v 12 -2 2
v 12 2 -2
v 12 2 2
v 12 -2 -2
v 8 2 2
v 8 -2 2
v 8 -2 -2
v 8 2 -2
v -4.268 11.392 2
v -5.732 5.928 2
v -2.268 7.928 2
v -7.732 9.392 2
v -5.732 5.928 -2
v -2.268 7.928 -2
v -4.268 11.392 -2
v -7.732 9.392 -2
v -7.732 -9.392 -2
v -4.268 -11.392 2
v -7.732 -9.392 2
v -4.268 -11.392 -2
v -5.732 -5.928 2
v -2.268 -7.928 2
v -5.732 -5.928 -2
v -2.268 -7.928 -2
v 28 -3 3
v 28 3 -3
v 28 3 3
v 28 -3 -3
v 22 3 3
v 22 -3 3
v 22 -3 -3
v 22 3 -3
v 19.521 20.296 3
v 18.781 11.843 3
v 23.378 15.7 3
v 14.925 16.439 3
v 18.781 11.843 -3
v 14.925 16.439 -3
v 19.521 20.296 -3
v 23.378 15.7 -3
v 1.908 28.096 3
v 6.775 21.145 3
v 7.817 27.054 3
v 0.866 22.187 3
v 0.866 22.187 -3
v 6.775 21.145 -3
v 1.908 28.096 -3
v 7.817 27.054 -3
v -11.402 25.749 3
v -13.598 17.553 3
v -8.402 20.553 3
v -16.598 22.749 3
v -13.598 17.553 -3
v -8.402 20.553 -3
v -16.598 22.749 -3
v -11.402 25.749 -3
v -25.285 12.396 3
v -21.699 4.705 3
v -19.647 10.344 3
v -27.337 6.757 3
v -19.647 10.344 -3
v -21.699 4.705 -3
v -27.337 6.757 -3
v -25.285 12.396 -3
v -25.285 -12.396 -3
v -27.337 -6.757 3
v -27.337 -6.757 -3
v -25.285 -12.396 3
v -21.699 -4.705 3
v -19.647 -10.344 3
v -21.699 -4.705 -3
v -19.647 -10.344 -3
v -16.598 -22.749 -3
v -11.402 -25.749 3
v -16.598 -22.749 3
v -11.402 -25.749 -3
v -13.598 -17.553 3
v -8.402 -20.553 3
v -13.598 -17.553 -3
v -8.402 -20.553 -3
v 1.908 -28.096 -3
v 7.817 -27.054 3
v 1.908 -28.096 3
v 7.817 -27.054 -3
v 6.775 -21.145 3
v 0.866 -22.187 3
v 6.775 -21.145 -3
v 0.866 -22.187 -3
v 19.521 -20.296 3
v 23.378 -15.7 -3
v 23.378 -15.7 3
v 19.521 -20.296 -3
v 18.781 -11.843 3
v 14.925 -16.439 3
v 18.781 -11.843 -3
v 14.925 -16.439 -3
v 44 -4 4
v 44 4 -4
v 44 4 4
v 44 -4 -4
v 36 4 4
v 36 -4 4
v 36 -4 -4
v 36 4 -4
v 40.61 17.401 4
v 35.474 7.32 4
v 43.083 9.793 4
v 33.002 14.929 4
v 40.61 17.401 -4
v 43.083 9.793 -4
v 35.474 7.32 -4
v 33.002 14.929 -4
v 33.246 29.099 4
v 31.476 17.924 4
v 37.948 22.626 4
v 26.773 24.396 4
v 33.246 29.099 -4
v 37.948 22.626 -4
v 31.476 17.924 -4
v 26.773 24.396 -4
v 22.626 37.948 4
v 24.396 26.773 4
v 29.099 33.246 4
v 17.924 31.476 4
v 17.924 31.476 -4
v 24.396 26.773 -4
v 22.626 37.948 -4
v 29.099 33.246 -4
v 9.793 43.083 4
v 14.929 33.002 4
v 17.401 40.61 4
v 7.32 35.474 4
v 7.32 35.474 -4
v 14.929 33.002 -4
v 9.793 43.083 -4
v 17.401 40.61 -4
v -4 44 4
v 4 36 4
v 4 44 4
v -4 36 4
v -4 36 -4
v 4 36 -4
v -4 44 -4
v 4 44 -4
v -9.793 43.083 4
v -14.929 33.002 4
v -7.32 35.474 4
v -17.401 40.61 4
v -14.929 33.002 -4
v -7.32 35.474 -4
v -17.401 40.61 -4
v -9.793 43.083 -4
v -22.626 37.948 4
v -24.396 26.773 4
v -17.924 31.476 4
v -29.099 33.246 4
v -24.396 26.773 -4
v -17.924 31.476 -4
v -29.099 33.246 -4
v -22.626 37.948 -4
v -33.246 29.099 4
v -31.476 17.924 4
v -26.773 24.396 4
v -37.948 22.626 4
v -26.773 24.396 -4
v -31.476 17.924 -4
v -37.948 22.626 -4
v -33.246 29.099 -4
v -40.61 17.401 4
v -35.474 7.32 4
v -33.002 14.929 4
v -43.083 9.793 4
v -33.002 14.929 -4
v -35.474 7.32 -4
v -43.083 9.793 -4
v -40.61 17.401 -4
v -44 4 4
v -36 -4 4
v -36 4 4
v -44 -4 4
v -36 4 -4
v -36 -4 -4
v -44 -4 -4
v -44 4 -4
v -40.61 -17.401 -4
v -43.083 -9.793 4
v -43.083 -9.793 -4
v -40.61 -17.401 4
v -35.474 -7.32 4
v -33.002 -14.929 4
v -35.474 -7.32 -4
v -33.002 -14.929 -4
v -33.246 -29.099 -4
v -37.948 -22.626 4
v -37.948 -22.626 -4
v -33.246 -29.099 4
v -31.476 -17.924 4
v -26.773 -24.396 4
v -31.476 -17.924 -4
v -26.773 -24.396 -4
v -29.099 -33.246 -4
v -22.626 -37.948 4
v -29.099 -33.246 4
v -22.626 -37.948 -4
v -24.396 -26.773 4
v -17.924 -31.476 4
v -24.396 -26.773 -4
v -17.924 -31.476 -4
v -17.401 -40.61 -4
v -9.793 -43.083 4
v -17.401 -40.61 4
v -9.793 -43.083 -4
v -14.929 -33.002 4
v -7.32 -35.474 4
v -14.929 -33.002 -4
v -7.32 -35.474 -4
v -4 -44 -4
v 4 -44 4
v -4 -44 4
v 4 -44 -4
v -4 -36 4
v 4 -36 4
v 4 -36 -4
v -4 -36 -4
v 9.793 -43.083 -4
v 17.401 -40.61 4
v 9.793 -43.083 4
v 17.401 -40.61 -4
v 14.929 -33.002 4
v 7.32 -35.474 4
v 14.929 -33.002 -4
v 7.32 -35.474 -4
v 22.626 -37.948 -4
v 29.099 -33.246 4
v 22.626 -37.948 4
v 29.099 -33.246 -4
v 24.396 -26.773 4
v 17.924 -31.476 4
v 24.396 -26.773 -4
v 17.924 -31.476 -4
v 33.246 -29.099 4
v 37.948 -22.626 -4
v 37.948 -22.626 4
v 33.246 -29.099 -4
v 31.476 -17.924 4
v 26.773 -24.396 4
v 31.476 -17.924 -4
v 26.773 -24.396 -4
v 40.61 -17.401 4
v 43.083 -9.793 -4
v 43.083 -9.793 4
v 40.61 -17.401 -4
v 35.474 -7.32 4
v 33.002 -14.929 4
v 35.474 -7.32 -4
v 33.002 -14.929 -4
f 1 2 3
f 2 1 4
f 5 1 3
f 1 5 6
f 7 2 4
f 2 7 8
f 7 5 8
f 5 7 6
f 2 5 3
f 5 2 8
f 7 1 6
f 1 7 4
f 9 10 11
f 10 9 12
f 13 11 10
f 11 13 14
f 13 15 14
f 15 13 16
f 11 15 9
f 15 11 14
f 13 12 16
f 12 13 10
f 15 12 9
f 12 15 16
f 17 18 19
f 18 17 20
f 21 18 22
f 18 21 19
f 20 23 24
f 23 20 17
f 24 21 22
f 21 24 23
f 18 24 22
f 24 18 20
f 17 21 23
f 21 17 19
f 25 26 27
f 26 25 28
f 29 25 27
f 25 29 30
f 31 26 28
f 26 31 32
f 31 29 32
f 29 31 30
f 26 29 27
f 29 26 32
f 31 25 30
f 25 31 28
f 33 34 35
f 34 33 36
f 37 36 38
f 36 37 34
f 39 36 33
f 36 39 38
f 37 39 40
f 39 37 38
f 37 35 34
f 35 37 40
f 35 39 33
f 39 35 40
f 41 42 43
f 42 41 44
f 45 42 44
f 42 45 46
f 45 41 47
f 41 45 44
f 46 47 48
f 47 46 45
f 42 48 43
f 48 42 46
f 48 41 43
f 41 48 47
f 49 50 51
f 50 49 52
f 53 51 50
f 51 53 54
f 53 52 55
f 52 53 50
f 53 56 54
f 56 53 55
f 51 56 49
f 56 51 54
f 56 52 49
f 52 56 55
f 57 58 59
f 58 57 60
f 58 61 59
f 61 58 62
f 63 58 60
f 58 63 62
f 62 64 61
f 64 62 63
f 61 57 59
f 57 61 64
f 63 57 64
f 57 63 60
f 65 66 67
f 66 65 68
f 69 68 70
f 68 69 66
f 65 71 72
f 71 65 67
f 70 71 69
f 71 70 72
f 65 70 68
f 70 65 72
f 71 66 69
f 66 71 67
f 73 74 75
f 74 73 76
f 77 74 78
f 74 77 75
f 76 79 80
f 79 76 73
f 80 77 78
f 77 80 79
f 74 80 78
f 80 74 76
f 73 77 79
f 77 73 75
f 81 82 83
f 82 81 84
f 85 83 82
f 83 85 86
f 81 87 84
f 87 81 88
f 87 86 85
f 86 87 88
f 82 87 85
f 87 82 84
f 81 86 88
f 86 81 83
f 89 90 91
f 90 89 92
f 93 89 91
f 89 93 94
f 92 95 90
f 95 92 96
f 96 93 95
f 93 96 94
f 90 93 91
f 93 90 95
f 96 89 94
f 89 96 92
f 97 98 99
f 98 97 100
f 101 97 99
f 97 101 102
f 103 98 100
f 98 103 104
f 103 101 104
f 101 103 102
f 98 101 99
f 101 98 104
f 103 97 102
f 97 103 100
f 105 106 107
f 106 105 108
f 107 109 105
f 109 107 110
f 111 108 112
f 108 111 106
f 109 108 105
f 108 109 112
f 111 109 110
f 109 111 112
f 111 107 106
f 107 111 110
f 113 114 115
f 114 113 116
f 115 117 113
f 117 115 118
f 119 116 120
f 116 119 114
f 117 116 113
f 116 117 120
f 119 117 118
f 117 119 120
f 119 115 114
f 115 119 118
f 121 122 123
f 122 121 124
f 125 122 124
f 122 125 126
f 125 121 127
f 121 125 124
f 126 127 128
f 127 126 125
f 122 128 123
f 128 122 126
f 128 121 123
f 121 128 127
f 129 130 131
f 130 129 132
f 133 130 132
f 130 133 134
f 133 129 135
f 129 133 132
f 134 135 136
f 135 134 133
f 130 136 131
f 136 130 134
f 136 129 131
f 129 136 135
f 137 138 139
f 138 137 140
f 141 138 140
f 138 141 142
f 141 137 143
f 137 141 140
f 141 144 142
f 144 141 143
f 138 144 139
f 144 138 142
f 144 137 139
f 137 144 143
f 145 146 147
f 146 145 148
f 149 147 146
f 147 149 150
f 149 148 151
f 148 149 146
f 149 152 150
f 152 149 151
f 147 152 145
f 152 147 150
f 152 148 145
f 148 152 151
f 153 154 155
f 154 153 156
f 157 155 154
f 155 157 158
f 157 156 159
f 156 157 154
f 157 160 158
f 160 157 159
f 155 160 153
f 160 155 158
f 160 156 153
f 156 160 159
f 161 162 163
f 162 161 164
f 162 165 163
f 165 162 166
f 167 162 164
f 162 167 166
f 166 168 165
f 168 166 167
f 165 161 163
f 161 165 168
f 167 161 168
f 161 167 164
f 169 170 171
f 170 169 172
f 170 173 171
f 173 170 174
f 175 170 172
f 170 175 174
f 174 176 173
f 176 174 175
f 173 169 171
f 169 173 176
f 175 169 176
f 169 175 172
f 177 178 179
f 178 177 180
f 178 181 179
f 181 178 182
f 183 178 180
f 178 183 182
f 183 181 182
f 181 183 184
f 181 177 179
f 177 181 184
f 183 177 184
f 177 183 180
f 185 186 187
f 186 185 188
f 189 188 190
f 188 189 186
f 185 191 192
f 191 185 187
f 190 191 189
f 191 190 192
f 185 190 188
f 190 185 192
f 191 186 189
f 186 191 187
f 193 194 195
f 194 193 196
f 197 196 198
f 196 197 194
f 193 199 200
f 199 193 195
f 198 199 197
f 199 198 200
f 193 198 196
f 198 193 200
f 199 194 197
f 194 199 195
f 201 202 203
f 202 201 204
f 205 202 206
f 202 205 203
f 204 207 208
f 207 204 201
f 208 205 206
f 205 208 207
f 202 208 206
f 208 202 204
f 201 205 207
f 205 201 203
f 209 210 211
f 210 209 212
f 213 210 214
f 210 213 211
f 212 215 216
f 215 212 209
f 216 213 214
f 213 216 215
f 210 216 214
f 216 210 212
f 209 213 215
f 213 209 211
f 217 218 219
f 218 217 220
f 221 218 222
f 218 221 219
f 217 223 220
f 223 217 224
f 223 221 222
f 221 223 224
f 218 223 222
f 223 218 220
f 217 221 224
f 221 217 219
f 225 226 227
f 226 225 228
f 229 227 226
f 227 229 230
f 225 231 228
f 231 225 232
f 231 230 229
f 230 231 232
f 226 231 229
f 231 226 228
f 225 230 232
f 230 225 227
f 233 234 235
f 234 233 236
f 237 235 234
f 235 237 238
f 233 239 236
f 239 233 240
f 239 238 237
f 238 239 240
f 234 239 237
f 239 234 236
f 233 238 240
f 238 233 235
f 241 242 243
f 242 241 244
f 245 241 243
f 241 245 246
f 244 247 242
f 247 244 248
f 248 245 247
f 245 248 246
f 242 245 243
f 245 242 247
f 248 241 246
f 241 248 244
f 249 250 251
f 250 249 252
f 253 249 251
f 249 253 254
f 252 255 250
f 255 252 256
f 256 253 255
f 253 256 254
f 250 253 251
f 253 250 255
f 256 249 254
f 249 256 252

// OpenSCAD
// Volume: 12375.997994183868, SurfaceArea: 9911.998977287582
echo(version=version());

function size(x) = assert(x % 2 == 0, "Size must be an even number") x;

module ring(r = 10, cnt = 3, s = 6) {
    assert(r >= 10, "Parameter r must be >= 10");
    assert(cnt >= 3 && cnt <= 20, "Parameter cnt must be between 3 and 20 (inclusive");
    for (a = [0 : cnt - 1]) {
        rotate(a * 360 / cnt) translate([r, 0, 0]) cube(size(s), center = true);
    }
}

// ring(5, 5, 4); // trigger assertion for parameter r

// ring(10, 2, 4); // trigger assertion for parameter cnt

// ring(10, 3, 5); // trigger assertion in function size()

color("red") ring(10, 3, 4);
color("green") ring(25, 9, 6);
color("blue") ring(40, 20, 8);

// Written in 2018 by Torsten Paul <Torsten.Paul@gmx.de>
//
// To the extent possible under law, the author(s) have dedicated all
// copyright and related and neighboring rights to this software to the
// public domain worldwide. This software is distributed without any
// warranty.
//
// You should have received a copy of the CC0 Public Domain
// Dedication along with this software.
// If not, see <http://creativecommons.org/publicdomain/zero/1.0/>.
